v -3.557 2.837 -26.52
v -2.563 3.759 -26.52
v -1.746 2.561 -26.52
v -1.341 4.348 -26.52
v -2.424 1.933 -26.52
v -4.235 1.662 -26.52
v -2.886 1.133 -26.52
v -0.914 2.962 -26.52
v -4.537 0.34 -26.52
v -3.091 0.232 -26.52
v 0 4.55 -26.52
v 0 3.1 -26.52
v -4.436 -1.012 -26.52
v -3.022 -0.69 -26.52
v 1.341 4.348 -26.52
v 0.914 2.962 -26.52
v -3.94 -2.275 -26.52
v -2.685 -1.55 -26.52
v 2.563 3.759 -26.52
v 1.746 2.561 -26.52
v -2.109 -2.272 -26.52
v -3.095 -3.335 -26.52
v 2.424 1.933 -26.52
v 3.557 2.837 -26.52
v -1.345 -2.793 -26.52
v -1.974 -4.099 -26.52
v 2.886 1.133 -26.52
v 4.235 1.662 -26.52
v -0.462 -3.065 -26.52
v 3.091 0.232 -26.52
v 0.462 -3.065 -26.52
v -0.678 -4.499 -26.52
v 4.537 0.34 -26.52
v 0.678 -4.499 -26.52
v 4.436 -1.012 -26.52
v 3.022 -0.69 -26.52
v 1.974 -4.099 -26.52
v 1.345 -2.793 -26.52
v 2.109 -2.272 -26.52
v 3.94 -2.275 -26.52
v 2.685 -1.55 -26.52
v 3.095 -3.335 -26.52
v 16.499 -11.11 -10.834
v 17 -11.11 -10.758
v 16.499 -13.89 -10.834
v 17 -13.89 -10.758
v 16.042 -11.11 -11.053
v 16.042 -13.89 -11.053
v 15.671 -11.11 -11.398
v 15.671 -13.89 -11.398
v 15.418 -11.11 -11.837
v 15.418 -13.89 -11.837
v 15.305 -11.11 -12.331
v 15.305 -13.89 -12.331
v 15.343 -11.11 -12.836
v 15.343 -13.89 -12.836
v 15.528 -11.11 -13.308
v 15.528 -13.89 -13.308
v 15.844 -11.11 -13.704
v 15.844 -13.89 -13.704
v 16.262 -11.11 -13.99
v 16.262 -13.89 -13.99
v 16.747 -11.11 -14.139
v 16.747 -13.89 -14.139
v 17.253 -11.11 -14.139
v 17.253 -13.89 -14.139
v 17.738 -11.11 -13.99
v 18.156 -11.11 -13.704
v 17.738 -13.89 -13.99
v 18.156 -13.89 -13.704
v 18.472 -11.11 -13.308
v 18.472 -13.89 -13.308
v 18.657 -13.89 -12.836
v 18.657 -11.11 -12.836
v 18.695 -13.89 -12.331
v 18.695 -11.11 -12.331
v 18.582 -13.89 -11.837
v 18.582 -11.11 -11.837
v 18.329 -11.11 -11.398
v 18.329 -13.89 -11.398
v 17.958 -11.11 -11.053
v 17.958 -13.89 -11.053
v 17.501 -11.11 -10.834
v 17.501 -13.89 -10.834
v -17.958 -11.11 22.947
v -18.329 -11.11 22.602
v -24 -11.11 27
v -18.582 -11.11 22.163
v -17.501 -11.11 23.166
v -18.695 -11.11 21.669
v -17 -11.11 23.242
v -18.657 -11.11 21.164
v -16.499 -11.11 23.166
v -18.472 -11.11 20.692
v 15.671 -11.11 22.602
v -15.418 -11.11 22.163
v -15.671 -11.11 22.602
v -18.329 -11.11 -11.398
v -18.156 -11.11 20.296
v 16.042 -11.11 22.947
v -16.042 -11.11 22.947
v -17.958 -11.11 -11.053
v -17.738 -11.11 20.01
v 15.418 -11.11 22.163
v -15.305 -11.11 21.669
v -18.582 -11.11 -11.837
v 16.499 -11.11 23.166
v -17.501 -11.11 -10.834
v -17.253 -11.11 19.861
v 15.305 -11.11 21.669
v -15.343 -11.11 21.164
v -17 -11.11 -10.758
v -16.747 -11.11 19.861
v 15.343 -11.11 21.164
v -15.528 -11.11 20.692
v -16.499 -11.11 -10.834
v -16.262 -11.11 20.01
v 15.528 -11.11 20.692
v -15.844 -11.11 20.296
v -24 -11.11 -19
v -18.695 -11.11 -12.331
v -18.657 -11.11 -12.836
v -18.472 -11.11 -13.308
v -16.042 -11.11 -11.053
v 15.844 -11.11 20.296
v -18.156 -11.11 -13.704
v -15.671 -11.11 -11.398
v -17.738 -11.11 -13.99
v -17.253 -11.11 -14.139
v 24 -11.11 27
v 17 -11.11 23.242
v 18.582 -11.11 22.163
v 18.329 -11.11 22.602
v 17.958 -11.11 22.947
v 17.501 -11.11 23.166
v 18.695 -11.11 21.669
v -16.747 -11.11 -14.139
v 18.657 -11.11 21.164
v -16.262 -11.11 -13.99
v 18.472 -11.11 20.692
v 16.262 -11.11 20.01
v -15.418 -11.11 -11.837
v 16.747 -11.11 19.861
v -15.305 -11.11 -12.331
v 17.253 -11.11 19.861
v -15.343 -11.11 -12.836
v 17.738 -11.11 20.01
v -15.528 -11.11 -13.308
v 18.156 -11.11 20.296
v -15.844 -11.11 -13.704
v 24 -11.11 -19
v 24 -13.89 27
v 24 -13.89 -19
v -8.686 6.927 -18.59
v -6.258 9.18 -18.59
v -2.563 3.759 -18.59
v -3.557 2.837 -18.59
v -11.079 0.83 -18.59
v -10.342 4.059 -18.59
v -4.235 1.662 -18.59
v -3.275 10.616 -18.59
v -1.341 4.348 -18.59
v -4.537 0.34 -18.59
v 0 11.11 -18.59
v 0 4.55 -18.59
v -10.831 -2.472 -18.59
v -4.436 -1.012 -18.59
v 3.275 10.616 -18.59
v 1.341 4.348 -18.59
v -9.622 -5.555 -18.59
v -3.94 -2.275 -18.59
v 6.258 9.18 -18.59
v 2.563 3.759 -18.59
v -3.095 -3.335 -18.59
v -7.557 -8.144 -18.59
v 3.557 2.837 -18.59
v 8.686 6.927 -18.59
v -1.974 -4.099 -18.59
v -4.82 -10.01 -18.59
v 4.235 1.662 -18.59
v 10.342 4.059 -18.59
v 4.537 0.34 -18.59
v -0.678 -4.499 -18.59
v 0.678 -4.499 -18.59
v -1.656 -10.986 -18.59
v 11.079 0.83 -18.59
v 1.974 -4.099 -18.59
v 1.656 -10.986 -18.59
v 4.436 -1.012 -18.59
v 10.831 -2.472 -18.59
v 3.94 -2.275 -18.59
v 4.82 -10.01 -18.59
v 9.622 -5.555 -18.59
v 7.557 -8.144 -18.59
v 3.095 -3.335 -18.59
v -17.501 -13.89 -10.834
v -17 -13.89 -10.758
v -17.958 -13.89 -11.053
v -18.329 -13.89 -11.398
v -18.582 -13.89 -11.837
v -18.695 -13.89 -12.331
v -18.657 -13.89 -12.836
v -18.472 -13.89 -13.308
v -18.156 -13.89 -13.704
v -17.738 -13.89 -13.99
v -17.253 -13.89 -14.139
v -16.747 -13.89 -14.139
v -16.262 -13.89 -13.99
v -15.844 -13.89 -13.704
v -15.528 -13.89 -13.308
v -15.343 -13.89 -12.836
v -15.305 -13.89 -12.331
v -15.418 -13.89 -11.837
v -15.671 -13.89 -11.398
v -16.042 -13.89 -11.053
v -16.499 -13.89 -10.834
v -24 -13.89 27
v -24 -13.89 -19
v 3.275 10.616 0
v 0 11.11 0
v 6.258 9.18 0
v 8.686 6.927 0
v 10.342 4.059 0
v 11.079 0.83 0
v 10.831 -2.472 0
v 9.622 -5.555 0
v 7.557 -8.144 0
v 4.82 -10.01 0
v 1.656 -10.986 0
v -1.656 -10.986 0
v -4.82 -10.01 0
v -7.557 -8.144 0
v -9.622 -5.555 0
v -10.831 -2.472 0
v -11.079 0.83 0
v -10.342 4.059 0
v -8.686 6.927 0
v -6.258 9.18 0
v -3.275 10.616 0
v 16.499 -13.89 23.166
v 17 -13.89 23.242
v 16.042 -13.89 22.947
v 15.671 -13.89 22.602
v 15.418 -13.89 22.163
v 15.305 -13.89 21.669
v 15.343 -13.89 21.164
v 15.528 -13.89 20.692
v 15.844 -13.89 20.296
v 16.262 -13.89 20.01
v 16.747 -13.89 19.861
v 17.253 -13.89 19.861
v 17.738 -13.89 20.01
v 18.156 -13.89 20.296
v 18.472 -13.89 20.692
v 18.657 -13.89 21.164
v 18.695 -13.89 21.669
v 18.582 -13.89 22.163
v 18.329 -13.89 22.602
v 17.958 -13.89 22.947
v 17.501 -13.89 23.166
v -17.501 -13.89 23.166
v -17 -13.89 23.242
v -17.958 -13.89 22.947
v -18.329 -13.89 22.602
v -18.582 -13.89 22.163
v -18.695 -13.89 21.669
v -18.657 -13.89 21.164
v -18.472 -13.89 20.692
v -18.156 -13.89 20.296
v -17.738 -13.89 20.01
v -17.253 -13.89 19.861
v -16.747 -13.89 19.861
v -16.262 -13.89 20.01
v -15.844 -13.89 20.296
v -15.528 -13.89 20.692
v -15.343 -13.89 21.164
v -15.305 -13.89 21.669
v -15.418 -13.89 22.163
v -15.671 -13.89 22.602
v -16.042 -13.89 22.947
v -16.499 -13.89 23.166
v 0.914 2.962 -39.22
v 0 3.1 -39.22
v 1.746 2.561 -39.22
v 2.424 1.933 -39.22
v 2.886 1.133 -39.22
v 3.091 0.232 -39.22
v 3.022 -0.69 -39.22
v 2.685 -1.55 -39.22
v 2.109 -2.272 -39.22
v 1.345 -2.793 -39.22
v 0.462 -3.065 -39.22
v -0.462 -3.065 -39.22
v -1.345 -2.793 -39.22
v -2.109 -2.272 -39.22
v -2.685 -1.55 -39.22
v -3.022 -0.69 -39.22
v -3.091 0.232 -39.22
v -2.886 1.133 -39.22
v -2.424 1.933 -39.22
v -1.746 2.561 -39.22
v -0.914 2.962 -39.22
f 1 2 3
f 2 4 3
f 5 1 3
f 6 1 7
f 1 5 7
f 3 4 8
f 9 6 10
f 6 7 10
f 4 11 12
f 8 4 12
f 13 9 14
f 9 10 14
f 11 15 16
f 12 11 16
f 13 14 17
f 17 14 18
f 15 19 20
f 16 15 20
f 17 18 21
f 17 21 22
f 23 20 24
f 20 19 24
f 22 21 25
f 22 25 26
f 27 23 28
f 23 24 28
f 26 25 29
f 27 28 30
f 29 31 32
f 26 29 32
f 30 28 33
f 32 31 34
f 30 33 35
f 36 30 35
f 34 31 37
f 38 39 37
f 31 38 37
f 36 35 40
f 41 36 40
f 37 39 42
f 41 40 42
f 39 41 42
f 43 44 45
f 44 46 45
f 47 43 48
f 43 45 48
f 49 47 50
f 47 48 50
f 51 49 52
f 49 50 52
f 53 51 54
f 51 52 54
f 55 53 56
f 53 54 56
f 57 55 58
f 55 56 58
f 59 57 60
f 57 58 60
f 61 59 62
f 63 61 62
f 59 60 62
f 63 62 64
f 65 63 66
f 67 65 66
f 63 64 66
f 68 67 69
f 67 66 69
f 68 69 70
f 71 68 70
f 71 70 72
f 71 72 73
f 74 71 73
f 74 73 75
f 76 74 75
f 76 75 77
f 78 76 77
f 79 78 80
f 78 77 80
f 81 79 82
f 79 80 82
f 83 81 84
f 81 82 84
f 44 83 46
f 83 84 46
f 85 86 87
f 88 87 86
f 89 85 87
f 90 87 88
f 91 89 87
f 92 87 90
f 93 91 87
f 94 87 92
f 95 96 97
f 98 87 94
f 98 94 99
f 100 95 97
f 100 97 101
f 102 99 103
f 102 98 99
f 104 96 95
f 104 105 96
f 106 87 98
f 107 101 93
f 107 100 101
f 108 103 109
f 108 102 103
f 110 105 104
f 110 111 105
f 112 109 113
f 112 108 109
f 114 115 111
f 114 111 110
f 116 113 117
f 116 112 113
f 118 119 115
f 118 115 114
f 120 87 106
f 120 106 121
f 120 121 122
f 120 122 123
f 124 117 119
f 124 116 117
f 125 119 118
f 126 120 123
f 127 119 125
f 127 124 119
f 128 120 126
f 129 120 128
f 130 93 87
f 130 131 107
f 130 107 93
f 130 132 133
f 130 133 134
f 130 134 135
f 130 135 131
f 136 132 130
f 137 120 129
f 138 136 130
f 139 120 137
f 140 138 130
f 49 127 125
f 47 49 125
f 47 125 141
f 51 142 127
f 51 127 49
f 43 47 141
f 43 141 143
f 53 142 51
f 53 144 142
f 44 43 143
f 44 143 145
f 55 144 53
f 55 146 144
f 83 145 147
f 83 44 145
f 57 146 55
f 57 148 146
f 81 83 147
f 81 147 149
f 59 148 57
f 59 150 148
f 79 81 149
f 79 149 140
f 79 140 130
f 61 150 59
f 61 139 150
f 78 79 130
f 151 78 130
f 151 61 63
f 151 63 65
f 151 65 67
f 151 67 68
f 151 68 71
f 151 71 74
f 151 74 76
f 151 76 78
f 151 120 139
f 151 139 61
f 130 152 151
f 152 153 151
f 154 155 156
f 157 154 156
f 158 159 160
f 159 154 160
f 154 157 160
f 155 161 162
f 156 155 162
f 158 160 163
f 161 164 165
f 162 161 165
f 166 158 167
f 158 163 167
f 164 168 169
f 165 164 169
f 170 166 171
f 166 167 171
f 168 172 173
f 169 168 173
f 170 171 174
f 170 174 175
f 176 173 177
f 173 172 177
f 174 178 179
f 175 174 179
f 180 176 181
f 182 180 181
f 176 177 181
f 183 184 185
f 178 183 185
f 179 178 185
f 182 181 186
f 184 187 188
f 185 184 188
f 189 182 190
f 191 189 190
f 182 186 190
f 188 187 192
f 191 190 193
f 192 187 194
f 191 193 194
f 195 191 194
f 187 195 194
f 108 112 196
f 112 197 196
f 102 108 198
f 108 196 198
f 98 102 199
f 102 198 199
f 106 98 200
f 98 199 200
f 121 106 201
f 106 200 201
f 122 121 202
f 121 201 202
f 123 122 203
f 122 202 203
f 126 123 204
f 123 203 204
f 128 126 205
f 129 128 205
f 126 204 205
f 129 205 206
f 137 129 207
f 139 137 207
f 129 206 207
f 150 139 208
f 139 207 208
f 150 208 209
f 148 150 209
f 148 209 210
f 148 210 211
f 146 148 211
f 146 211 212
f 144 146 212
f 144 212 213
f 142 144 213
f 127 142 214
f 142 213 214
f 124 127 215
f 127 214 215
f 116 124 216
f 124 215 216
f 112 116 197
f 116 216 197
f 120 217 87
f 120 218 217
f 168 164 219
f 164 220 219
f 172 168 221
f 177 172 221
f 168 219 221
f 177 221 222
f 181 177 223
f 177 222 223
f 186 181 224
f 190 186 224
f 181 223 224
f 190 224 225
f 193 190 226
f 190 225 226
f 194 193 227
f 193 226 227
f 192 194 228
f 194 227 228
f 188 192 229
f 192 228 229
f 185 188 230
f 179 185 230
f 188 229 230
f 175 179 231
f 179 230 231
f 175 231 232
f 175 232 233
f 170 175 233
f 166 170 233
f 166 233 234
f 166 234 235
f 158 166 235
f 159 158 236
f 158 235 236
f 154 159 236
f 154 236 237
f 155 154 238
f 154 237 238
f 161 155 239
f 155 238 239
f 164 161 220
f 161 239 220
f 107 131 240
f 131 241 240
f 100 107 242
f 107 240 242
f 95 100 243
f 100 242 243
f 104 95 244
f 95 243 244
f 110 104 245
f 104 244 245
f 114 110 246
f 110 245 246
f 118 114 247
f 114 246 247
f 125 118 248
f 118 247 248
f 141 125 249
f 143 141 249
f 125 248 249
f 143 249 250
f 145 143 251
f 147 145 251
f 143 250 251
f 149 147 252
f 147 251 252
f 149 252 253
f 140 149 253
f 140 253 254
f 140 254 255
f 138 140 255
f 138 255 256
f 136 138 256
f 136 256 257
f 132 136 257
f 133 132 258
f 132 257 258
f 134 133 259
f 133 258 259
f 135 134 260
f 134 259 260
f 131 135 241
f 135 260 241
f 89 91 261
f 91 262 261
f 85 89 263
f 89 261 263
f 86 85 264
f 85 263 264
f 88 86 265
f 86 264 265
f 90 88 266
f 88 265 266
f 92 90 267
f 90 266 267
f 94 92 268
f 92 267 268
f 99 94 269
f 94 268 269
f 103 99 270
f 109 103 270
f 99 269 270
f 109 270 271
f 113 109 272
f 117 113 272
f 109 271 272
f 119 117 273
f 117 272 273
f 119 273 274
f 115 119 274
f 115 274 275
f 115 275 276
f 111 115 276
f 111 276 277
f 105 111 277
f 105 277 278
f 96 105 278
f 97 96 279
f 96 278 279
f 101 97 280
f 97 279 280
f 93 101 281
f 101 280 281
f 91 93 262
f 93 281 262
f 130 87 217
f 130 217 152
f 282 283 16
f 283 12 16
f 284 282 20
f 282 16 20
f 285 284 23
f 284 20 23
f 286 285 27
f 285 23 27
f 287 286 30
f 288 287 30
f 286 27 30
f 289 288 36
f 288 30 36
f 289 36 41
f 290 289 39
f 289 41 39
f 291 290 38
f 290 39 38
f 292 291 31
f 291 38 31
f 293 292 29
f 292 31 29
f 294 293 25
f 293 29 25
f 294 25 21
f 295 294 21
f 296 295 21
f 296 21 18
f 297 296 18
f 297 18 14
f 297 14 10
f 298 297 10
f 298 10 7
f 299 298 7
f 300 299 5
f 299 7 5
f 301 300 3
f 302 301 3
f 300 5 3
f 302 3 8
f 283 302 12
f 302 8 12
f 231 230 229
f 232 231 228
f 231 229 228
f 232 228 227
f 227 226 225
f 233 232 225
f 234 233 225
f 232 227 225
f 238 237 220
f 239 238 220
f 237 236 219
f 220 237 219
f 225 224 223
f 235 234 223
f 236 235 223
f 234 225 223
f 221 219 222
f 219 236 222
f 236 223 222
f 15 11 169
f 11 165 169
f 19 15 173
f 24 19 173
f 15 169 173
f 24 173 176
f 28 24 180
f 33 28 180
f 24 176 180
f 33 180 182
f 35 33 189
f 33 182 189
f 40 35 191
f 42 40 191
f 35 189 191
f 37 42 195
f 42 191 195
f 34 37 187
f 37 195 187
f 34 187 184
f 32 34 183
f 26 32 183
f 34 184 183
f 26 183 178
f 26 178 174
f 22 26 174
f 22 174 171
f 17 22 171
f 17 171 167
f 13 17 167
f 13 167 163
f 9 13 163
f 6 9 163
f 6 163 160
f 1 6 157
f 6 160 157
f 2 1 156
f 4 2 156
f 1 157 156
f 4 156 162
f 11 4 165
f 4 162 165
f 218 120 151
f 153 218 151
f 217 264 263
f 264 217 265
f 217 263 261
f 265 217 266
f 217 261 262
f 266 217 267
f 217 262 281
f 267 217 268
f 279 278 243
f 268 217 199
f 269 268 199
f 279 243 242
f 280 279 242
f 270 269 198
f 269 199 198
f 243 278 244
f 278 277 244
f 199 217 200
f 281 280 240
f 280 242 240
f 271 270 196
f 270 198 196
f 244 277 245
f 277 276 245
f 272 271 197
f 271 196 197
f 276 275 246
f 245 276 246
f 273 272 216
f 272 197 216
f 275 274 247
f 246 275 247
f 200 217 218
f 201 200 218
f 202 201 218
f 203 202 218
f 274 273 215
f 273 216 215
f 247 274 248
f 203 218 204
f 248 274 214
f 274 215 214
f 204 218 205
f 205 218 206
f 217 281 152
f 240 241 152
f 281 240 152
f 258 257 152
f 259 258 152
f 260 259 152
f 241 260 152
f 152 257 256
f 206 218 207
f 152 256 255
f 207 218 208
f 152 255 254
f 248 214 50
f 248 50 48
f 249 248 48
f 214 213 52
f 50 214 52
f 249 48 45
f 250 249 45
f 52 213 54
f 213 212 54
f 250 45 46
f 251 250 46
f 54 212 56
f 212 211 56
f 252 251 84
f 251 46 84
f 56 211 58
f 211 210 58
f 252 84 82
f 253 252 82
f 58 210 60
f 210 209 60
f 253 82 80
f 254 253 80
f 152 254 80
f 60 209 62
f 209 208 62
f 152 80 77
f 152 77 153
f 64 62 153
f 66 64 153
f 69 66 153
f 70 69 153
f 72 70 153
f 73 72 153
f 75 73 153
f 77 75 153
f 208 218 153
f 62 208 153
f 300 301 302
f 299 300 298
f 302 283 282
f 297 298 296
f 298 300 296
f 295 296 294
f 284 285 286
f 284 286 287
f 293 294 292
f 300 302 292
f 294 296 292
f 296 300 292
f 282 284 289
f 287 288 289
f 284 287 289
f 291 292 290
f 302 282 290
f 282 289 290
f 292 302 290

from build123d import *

# Parameters (mm, degrees)
CROQUIS2_W                            = 48
CROQUIS2_H                            = 2.78
SALIENTE_EXTRUIR1_DEPTH               = 19
CROQUIS2_3_W                          = 48
CROQUIS2_3_H                          = 2.78
SALIENTE_EXTRUIR2_DEPTH               = 27
CROQUIS5_W                            = 1.7
CROQUIS5_H                            = 2.78
TALADRO_DE_MARGEN_PARA_M31_AT_2_COUNT = 2
TALADRO_DE_MARGEN_PARA_M31_AT_2_PITCH = 34
TALADRO_DE_MARGEN_PARA_M31_AT_3_COUNT = 2
TALADRO_DE_MARGEN_PARA_M31_AT_3_PITCH = 48.083261121
TALADRO_DE_MARGEN_PARA_M31_AT_4_COUNT = 2
TALADRO_DE_MARGEN_PARA_M31_AT_4_PITCH = 34


with BuildPart() as part:
    # Croquis1 → Revolución1 (revolve)
    with BuildSketch(Plane(origin=(0, 0, 0), x_dir=(0, 0, -1), z_dir=(1, 0, 0))):
        Polygon((0, 0), (39.22, 0), (39.22, 3.1), (26.52, 3.1), (26.52, 4.55), (18.59, 4.55), (18.59, 11.11), (0, 11.11), align=None)
    revolve(axis=Axis((0, 0, 0), (0, 0, -1)))


with BuildPart() as body_2:
    # Croquis2 → Saliente-Extruir1 (new body)
    with BuildSketch(Plane.XY):
        with Locations((0, -12.5)):
            Rectangle(CROQUIS2_W, CROQUIS2_H)
    extrude(amount=-SALIENTE_EXTRUIR1_DEPTH)

    # Croquis2<3> → Saliente-Extruir2 (add)
    with BuildSketch(Plane.XY):
        with Locations((0, -12.5)):
            Rectangle(CROQUIS2_3_W, CROQUIS2_3_H)
    extrude(amount=SALIENTE_EXTRUIR2_DEPTH)

    # Croquis5 → Taladro de margen para M31 (revolve, cut)
    with BuildSketch(Plane(origin=(-17, -11.11, -12.458), x_dir=(0, 0, 1), z_dir=(1, 0, 0))):
        with Locations((0.85, 1.39)):
            Rectangle(CROQUIS5_W, CROQUIS5_H)
    taladro_de_margen_para_m31 = revolve(axis=Axis((-17, -4.76, -12.458), (0, -1, 0)), mode=Mode.SUBTRACT)

    # Taladro de margen para M31 at 2: Taladro de margen para M31 ×2
    with Locations(*[(0, 0, i * TALADRO_DE_MARGEN_PARA_M31_AT_2_PITCH) for i in range(1, TALADRO_DE_MARGEN_PARA_M31_AT_2_COUNT)]):
        add(taladro_de_margen_para_m31, mode=Mode.SUBTRACT)

    # Taladro de margen para M31 at 3: Taladro de margen para M31 ×2
    with Locations(*[Vector(0.7071067811865476, 0, 0.7071067811865476) * (i * TALADRO_DE_MARGEN_PARA_M31_AT_3_PITCH) for i in range(1, TALADRO_DE_MARGEN_PARA_M31_AT_3_COUNT)]):
        add(taladro_de_margen_para_m31, mode=Mode.SUBTRACT)

    # Taladro de margen para M31 at 4: Taladro de margen para M31 ×2
    with Locations(*[(i * TALADRO_DE_MARGEN_PARA_M31_AT_4_PITCH, 0, 0) for i in range(1, TALADRO_DE_MARGEN_PARA_M31_AT_4_COUNT)]):
        add(taladro_de_margen_para_m31, mode=Mode.SUBTRACT)


solid = Compound([part.part, body_2.part])
